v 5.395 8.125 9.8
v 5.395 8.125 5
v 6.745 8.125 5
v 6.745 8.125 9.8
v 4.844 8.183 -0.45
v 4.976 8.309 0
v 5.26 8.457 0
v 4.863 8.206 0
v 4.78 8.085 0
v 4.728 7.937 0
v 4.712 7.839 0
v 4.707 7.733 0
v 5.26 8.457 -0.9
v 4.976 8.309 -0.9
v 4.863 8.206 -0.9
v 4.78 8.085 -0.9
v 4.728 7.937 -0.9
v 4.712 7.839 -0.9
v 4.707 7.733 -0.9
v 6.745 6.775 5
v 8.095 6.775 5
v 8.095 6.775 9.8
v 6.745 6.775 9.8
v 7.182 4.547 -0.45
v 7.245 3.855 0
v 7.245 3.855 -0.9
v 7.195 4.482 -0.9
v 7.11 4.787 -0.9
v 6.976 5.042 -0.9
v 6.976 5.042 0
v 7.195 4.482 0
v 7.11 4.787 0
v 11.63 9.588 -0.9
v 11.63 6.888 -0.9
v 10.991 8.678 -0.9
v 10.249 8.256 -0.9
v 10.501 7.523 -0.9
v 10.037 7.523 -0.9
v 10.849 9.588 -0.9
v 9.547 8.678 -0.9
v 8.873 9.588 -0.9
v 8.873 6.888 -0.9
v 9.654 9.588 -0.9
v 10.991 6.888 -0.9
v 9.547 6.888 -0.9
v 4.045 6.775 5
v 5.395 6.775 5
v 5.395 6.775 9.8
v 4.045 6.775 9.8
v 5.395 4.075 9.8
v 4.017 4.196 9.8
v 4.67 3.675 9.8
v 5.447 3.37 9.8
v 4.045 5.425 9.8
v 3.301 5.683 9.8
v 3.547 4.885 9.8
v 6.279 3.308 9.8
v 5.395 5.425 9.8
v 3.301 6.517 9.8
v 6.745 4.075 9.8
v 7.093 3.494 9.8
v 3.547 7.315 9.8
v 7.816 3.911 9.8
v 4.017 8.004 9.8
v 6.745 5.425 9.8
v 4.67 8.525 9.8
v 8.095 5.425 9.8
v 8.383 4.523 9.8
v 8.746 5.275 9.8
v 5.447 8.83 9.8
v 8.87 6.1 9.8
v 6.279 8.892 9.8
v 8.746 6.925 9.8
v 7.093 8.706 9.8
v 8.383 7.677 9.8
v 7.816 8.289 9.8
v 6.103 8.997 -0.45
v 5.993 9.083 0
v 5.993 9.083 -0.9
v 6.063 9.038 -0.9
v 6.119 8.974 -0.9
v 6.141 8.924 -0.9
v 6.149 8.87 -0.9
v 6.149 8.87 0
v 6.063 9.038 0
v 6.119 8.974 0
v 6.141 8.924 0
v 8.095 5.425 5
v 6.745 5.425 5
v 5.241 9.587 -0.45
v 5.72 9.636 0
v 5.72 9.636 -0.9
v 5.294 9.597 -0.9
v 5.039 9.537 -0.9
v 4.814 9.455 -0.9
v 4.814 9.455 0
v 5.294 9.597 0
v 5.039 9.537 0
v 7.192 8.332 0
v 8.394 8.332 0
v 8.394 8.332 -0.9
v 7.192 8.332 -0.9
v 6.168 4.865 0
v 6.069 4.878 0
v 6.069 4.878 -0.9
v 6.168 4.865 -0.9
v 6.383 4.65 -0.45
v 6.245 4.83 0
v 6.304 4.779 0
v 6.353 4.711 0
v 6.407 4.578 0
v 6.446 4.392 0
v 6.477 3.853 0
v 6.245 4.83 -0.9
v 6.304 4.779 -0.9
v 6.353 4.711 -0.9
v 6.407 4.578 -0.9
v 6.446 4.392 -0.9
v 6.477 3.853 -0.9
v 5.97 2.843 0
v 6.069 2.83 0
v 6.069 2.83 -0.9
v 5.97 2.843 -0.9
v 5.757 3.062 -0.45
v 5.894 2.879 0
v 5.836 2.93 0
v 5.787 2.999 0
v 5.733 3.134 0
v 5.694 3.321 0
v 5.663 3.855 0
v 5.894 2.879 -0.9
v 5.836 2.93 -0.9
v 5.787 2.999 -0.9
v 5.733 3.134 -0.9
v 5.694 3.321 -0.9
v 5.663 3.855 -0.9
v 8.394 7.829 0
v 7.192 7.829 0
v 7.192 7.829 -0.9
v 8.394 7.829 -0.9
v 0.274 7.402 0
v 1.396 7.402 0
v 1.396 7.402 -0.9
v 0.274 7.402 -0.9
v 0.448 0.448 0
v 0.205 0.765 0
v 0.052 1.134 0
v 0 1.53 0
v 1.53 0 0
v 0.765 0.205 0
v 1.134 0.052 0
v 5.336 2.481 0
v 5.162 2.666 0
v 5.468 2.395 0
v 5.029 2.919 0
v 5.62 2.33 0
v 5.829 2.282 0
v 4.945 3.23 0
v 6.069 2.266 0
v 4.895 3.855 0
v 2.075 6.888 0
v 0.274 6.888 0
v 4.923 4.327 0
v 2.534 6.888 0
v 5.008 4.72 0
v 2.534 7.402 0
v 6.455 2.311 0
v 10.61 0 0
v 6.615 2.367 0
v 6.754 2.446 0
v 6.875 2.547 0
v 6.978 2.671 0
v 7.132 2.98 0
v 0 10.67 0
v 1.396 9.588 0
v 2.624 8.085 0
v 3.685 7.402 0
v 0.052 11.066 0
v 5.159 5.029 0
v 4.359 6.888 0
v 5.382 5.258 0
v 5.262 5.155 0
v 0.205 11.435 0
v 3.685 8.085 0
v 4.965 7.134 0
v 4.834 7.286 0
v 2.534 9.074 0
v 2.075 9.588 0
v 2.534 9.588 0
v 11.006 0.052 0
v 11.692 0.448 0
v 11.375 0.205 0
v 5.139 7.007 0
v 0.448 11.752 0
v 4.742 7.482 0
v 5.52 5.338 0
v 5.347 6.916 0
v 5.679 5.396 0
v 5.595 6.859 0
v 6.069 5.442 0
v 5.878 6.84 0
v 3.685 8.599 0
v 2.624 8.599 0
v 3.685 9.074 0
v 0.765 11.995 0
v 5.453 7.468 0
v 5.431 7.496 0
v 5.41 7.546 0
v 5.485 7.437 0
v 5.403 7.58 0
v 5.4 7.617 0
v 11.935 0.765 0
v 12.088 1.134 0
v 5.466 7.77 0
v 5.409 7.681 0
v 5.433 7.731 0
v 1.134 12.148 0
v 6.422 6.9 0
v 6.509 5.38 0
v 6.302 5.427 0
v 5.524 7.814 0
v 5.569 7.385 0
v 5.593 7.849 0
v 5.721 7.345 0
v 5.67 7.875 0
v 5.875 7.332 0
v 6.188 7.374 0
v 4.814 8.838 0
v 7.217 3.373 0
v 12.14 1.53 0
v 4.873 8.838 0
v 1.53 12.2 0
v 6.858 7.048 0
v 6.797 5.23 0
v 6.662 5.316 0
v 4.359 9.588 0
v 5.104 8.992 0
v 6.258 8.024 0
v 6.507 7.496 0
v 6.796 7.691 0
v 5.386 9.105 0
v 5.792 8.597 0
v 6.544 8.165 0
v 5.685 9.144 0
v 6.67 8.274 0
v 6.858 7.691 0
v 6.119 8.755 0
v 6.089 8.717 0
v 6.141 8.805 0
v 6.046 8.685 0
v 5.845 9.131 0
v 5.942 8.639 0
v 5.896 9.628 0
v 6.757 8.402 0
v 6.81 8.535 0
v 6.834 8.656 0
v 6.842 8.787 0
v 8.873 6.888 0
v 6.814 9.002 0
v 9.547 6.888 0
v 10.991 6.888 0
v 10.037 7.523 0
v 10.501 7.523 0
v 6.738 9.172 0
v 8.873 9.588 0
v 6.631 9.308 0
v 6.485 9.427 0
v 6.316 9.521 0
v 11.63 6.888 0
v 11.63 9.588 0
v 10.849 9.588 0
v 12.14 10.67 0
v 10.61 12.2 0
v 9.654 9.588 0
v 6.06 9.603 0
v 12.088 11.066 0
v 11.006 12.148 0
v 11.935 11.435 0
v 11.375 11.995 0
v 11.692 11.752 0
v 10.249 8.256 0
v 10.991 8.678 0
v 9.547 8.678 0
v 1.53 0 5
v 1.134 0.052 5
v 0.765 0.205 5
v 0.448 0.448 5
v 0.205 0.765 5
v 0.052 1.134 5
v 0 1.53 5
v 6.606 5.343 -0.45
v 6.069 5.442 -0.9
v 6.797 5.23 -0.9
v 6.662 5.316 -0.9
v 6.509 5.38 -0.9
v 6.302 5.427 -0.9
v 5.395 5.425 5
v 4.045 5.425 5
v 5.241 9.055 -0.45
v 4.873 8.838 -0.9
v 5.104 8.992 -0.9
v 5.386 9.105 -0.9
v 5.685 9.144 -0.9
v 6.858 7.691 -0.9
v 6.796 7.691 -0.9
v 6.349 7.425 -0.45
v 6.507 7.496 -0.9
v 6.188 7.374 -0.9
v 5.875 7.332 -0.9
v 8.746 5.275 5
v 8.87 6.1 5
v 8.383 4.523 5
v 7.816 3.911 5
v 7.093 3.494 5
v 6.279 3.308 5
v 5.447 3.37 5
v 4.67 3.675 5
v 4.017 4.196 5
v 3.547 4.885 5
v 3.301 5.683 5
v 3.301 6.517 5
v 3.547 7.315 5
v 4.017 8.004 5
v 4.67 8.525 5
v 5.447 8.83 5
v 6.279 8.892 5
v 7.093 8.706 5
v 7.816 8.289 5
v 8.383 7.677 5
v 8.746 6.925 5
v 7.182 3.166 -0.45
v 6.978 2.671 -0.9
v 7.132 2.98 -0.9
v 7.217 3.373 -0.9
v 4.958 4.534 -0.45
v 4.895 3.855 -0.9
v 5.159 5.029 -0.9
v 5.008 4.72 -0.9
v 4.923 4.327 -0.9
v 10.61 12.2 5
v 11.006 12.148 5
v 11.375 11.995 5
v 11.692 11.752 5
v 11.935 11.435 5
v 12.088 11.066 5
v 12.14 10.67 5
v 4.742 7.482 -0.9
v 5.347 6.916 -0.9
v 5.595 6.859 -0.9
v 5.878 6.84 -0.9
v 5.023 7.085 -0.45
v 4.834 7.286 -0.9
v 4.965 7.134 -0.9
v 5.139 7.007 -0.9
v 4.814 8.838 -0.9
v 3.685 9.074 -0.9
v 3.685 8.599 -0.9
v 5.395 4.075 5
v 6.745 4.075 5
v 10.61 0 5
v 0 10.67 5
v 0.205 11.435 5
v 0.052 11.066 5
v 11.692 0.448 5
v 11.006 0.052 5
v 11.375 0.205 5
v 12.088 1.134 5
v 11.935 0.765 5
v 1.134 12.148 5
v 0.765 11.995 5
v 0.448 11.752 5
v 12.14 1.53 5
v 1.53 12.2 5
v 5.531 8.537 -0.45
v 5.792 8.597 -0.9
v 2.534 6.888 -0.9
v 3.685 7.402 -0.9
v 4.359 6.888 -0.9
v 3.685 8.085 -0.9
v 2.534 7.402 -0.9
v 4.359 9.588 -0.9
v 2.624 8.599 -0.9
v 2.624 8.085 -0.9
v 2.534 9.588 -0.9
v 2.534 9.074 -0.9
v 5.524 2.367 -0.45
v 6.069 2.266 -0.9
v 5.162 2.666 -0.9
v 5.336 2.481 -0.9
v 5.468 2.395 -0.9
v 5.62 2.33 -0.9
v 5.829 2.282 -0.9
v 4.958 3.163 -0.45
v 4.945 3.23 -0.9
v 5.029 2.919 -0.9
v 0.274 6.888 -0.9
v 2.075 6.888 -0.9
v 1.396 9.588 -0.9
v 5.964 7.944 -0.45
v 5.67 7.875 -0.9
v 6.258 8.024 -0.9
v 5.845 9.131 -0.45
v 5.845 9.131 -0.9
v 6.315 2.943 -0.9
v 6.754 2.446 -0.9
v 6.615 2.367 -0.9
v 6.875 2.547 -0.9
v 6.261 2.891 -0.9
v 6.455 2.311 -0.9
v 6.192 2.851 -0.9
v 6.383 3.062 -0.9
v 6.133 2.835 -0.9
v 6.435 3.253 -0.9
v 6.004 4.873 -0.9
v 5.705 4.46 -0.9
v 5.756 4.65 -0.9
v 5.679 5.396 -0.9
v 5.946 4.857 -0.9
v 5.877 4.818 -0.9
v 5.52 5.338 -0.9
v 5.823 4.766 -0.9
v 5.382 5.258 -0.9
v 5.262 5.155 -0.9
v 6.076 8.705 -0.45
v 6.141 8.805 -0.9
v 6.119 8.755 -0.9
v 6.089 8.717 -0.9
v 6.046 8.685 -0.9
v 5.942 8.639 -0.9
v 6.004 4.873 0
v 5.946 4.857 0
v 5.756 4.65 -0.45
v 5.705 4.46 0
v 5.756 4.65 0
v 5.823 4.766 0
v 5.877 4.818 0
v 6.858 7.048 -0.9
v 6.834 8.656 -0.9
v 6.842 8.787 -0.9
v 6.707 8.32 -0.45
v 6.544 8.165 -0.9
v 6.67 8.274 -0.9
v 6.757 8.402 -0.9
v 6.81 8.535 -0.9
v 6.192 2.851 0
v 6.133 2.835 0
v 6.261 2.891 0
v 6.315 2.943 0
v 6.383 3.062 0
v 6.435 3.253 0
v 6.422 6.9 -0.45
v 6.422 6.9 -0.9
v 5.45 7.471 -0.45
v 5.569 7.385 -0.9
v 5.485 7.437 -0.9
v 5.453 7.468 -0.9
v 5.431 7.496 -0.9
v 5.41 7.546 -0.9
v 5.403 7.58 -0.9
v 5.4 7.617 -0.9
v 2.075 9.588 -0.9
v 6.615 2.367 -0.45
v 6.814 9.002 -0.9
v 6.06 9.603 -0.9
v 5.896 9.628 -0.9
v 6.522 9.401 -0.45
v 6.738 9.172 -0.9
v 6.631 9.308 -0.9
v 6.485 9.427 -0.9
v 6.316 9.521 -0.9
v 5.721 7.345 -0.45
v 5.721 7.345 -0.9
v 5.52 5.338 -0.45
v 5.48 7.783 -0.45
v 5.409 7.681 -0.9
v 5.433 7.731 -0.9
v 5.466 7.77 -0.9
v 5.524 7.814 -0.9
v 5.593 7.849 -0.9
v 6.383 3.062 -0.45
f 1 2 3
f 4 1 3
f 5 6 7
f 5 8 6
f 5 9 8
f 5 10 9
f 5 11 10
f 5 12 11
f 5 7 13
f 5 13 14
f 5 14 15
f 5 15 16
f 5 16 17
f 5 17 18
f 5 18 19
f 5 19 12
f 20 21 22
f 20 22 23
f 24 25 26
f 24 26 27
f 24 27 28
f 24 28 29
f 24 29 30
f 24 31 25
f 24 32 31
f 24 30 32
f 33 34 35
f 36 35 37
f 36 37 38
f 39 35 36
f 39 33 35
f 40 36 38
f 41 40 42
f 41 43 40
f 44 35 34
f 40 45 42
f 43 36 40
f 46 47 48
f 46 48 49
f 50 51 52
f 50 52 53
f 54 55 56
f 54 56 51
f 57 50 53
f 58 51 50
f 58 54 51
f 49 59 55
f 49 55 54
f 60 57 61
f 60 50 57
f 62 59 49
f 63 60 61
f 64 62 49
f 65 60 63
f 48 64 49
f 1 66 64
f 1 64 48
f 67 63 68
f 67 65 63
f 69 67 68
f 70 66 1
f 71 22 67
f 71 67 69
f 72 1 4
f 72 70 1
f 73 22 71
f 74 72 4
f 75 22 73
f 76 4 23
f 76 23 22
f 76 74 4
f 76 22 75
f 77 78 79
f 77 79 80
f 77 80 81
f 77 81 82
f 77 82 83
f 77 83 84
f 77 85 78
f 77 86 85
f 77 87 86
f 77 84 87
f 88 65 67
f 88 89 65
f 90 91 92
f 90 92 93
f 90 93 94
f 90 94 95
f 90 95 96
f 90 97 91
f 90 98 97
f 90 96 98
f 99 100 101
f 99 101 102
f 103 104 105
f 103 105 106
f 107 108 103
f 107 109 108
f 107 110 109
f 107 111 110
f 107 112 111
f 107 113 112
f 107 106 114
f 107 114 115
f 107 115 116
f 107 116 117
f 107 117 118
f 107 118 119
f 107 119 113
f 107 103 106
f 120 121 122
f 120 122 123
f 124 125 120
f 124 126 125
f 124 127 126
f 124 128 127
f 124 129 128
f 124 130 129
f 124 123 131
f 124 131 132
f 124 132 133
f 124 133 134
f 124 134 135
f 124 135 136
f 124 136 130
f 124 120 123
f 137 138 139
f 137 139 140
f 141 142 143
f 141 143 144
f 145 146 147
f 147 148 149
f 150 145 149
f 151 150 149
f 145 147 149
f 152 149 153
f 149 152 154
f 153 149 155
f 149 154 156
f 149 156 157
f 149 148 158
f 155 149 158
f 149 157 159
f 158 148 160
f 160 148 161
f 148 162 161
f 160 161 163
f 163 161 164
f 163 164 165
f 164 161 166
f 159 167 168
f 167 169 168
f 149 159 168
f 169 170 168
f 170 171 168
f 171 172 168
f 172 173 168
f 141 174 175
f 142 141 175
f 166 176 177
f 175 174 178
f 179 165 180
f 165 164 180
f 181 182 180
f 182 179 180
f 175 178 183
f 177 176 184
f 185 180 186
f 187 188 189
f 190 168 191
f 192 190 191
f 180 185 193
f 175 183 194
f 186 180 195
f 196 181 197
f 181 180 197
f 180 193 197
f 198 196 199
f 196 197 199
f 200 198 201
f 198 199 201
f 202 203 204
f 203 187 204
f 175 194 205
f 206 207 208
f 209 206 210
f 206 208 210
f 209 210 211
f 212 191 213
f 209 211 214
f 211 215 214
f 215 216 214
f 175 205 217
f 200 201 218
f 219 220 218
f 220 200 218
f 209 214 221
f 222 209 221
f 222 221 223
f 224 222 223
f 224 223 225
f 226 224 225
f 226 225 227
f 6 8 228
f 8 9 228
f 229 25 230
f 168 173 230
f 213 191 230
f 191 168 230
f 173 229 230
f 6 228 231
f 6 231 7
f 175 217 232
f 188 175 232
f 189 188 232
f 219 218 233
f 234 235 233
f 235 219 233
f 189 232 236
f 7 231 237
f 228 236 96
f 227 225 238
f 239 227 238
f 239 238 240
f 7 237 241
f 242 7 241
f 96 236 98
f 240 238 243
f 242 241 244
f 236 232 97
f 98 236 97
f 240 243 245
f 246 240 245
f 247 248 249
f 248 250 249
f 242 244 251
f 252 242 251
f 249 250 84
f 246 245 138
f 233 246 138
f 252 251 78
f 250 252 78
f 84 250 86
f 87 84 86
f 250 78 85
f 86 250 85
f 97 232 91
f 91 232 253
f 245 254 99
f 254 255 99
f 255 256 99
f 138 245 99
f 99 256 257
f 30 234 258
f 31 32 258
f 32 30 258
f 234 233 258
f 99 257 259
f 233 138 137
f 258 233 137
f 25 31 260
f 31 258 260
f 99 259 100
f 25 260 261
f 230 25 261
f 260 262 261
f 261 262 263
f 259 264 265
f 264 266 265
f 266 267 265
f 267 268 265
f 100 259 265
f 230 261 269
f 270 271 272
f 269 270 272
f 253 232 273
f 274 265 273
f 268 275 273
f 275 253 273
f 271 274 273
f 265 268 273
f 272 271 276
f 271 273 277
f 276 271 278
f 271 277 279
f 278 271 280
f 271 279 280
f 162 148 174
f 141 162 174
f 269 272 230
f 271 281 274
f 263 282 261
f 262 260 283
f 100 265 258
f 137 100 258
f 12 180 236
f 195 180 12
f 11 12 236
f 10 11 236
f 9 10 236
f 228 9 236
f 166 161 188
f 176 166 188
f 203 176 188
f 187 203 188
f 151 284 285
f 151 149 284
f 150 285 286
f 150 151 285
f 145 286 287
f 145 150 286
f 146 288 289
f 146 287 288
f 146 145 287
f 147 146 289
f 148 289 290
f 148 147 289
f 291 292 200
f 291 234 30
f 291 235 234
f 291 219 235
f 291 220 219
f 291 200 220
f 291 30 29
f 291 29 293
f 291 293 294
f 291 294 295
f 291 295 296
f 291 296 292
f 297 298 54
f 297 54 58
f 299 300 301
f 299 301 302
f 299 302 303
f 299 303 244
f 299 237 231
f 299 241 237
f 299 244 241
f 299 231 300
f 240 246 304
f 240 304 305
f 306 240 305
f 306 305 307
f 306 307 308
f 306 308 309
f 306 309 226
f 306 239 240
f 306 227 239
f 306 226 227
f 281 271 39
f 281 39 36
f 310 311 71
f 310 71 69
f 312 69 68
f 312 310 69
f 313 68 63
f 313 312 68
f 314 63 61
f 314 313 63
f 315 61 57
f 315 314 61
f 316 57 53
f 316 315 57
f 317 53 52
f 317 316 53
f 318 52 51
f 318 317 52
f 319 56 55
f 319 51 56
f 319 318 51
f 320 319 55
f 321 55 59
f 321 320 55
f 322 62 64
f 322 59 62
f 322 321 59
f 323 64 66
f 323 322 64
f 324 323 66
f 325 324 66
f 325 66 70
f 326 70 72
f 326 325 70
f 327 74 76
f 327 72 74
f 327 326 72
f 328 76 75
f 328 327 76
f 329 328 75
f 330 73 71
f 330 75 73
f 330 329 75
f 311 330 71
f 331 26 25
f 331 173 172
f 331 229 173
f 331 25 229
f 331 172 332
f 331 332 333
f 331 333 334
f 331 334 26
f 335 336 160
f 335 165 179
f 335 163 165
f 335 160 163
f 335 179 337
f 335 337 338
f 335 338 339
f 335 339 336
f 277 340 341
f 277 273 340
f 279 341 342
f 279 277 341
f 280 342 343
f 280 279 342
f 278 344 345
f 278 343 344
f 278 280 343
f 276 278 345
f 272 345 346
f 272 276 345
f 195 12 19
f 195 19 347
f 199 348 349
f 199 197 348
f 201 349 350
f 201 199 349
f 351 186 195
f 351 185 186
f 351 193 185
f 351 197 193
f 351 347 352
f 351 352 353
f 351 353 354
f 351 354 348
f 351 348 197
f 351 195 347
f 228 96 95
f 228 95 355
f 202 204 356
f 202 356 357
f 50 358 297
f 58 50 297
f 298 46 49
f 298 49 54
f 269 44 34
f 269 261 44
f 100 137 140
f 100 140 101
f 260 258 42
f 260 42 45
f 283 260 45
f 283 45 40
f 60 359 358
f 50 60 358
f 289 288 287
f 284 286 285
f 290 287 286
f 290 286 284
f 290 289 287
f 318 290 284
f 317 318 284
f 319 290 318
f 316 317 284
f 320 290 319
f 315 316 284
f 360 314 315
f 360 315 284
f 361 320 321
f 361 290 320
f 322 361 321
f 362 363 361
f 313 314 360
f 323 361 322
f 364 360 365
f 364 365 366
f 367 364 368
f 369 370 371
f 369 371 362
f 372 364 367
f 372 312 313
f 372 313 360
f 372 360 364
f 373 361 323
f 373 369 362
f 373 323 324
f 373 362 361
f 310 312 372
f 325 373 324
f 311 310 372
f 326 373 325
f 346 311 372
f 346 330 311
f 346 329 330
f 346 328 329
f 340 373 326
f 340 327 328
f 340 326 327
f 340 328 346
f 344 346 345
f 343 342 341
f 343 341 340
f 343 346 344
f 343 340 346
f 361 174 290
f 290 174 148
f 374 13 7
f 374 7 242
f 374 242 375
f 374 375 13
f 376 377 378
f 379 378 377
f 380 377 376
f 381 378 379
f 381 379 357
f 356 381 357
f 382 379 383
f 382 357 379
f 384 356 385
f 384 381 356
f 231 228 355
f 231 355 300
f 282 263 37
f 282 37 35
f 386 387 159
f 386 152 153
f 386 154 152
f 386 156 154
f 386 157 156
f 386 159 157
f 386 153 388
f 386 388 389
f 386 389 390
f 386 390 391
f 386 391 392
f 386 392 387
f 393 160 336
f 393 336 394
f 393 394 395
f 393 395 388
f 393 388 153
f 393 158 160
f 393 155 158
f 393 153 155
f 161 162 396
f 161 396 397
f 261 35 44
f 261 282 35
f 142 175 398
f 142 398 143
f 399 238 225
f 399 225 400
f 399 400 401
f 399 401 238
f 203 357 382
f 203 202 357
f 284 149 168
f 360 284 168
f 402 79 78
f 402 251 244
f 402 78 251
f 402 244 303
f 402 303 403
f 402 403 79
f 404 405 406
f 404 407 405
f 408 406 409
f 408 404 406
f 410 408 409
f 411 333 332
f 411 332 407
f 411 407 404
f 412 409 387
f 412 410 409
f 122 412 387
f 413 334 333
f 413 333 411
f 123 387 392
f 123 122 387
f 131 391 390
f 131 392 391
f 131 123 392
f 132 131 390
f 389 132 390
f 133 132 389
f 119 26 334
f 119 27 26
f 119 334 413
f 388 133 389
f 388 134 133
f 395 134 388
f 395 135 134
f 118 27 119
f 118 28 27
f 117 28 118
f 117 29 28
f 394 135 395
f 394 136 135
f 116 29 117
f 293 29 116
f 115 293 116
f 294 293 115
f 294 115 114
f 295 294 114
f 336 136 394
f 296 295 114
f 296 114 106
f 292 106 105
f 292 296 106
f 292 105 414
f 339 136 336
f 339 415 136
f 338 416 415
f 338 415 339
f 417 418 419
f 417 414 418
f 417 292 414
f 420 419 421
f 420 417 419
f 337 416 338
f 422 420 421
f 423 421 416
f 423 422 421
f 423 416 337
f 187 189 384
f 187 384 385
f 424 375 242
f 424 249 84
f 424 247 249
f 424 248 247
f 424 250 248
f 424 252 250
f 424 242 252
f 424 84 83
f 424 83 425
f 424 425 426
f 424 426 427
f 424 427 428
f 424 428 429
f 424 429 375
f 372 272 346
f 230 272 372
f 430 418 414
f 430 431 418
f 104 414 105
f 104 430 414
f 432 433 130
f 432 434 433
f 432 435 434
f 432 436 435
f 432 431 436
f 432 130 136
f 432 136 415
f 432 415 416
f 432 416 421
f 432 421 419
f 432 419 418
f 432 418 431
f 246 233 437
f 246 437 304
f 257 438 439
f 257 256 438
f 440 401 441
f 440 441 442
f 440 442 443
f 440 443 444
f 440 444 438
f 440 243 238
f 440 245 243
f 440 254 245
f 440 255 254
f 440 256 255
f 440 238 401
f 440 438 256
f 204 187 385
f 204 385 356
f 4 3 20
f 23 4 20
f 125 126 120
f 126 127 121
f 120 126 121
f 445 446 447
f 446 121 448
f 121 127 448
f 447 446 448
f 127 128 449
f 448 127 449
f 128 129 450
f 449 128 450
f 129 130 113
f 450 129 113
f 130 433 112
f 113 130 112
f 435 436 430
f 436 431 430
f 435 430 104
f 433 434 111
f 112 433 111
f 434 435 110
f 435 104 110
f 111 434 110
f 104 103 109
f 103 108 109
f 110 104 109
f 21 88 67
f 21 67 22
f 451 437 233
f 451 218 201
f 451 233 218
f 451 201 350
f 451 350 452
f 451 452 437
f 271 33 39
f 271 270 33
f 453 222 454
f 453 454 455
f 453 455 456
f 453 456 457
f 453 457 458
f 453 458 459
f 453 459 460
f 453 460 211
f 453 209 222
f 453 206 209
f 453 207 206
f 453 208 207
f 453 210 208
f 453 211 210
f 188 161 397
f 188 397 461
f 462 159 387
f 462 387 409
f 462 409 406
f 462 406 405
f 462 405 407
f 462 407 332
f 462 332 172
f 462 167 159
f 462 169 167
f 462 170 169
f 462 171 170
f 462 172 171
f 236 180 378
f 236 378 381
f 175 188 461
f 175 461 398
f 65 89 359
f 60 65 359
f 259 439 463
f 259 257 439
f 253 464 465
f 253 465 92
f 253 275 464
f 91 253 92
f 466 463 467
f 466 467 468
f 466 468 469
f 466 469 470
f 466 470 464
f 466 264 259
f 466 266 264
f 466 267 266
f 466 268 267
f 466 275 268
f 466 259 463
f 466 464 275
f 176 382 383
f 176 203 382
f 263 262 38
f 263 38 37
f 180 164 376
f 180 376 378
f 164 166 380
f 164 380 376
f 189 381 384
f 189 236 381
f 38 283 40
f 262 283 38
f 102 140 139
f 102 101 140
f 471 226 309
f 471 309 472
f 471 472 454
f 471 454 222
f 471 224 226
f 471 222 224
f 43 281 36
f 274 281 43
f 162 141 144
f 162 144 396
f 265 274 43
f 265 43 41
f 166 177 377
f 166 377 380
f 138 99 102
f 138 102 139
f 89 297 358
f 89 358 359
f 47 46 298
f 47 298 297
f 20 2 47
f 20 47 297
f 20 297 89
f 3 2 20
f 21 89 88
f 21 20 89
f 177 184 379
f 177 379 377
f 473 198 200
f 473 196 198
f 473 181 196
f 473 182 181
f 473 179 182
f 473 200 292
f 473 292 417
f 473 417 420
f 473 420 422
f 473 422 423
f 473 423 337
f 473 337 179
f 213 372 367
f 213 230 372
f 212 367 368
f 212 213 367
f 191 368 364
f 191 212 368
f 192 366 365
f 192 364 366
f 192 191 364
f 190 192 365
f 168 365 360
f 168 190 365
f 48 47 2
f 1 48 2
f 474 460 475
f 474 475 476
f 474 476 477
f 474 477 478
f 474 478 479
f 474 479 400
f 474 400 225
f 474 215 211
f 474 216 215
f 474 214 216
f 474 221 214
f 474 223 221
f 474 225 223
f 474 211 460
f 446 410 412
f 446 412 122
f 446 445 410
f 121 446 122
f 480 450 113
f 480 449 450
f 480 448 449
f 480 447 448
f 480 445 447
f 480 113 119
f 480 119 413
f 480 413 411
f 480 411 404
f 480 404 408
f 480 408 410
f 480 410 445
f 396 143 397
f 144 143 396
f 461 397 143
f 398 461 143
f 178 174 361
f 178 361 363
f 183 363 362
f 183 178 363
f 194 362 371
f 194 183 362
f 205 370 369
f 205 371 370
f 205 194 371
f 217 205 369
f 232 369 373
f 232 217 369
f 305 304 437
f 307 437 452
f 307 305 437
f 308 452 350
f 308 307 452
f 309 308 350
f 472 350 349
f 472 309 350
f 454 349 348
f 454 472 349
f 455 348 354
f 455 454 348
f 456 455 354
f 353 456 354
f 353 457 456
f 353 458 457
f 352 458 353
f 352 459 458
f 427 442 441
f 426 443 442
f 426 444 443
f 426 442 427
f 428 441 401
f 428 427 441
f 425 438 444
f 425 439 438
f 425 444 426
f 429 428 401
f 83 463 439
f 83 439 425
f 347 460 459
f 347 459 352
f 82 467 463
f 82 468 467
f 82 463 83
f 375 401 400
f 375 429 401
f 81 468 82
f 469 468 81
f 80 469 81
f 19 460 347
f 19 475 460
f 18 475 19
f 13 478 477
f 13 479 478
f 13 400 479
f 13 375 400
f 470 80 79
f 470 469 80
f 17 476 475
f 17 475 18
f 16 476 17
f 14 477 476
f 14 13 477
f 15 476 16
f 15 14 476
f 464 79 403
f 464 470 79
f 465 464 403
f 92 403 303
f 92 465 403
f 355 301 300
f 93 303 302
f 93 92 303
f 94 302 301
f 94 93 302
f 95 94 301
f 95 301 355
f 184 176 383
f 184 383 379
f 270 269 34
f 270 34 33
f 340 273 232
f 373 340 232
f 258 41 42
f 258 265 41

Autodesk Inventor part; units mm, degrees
ref_plane "YZ Plane" through (0, 0, 0) normal (1, 0, 0) x (0, 1, 0)
ref_plane "XZ Plane" through (0, 0, 0) normal (0, 1, 0) x (-1, 0, 0)
sketch "Sketch1" plane through (0, 0, 0) normal (0, 0, 1) x (1, 0, 0)
  line L0 (14.6962, 12.74) -> (14.6962, 0) construction
  line L1 (10.61, 12.2) -> (1.53, 12.2)
  arc A0 (1.53, 12.2) -> (0, 10.67) centre (1.53, 10.67) ccw
  line L2 (0, 10.67) -> (0, 1.53)
  arc A1 (0, 1.53) -> (1.53, 0) centre (1.53, 1.53) ccw
  line L3 (1.53, 0) -> (10.61, 0)
  arc A2 (10.61, 0) -> (12.14, 1.53) centre (10.61, 1.53) ccw
  arc A3 (12.14, 10.67) -> (10.61, 12.2) centre (10.61, 10.67) ccw
  line L4 (12.14, 10.67) -> (12.14, 1.53)
  point P0 (0, 0)
  point P1 (0, 0)
  dimension "d10" = 12.74
ref_plane "Work Plane1" through (0, 0, 5) normal (0, 0, 1) x (1, 0, 0)
sketch "Sketch2" plane through (0, 0, 5) normal (0, 0, 1) x (1, 0, 0)
  line L0 (10.88, 12.74) -> (1.8, 12.74) projected
  line L1 (10.88, 12.74) -> (1.8, 12.74) projected
  arc A0 (1.8, 12.74) -> (0, 10.94) centre (1.8, 10.94) ccw projected
  line L2 (0, 10.94) -> (0, 1.8) projected
  arc A1 (0, 1.8) -> (1.8, 0) centre (1.8, 1.8) ccw projected
  line L3 (1.8, 0) -> (10.88, 0) projected
  arc A2 (10.88, 0) -> (12.68, 1.8) centre (10.88, 1.8) ccw projected
  line L4 (12.68, 1.8) -> (12.68, 10.94) projected
  arc A3 (12.68, 10.94) -> (10.88, 12.74) centre (10.88, 10.94) ccw projected
  circle A4 centre (6.34, 6.37) radius 2.8
  line L5 (5.665, 8.395) -> (7.015, 8.395)
  line L6 (7.015, 4.345) -> (5.665, 4.345)
  line L7 (5.665, 4.345) -> (7.015, 8.395) construction
  line L8 (5.665, 8.395) -> (7.015, 4.345) construction
  line L9 (8.365, 5.695) -> (8.365, 7.045)
  line L10 (4.315, 7.045) -> (4.315, 5.695)
  line L11 (4.315, 5.695) -> (8.365, 7.045) construction
  line L12 (8.365, 5.695) -> (4.315, 7.045) construction
  line L13 (4.315, 5.695) -> (5.665, 5.695)
  line L14 (7.015, 5.695) -> (8.365, 5.695)
  line L15 (5.665, 4.345) -> (5.665, 5.695)
  line L16 (5.665, 7.045) -> (5.665, 8.395)
  line L17 (8.365, 7.045) -> (7.015, 7.045)
  line L18 (5.665, 7.045) -> (4.315, 7.045)
  line L19 (7.015, 8.395) -> (7.015, 7.045)
  line L20 (7.015, 5.695) -> (7.015, 4.345)
  point P0 (0, 0)
  dimension "d3" = 5.6
  dimension "d4" = 4.05
  dimension "d5" = 1.35
  dimension "d6" = 4.05
  dimension "d7" = 1.35
extrude "Extrusion3" add sketch "Sketch1" along normal blind 5
sketch "Sketch3" plane through (0, 0, 5) normal (0, 0, 1) x (1, 0, 0)
  line L0 (10.61, 12.47) -> (1.53, 12.47)
  line L1 (10.61, 12.47) -> (1.53, 12.47)
  arc A0 (1.53, 12.47) -> (-0.27, 10.67) centre (1.53, 10.67) ccw
  line L2 (-0.27, 10.67) -> (-0.27, 1.53)
  arc A1 (-0.27, 1.53) -> (1.53, -0.27) centre (1.53, 1.53) ccw
  line L3 (1.53, -0.27) -> (10.61, -0.27)
  arc A2 (10.61, -0.27) -> (12.41, 1.53) centre (10.61, 1.53) ccw
  line L4 (12.41, 1.53) -> (12.41, 10.67)
  arc A3 (12.41, 10.67) -> (10.61, 12.47) centre (10.61, 10.67) ccw
  circle A4 centre (6.07, 6.1) radius 2.8
  line L5 (5.395, 8.125) -> (6.745, 8.125)
  line L6 (6.745, 4.075) -> (5.395, 4.075)
  line L7 (5.395, 4.075) -> (6.745, 8.125) construction
  line L8 (5.395, 8.125) -> (6.745, 4.075) construction
  line L9 (8.095, 5.425) -> (8.095, 6.775)
  line L10 (4.045, 6.775) -> (4.045, 5.425)
  line L11 (4.045, 5.425) -> (8.095, 6.775) construction
  line L12 (8.095, 5.425) -> (4.045, 6.775) construction
  line L13 (4.045, 5.425) -> (5.395, 5.425)
  line L14 (6.745, 5.425) -> (8.095, 5.425)
  line L15 (5.395, 4.075) -> (5.395, 5.425)
  line L16 (5.395, 6.775) -> (5.395, 8.125)
  line L17 (8.095, 6.775) -> (6.745, 6.775)
  line L18 (5.395, 6.775) -> (4.045, 6.775)
  line L19 (6.745, 8.125) -> (6.745, 6.775)
  line L20 (6.745, 5.425) -> (6.745, 4.075)
  line L21 (10.61, 12.2) -> (1.53, 12.2) projected
  line L22 (0, 10.67) -> (0, 1.53) projected
  point P0 (0, 0)
  point P1 (-0.27, -0.27)
  point P2 (6.07, 12.2)
  point P3 (0, 6.1)
  point P4 (6.07, 6.1)
  dimension "d14" = 5.6
  dimension "d15" = 4.05
  dimension "d16" = 1.35
  dimension "d17" = 4.05
  dimension "d18" = 1.35
extrude "Extrusion4" add sketch "Sketch3" along normal blind 4.8 contours A4
sketch "Sketch4" plane through (0, 0, 0) normal (0, 0, -1) x (-1, 0, 0)
  line L0 (-13.9436, 0) -> (-13.9436, 2.266)
  line L1 (-15.5559, 0) -> (-15.5559, 6.84)
  line L2 (-1.53, 0) -> (-10.61, 0) projected
  line L3 (-11.9098, 9.6363) -> (-0.2302, 9.6363) construction
  line L4 (-0.2302, 9.6363) -> (-0.2302, 6.84) construction
  line L5 (-0.2302, 6.84) -> (-11.9098, 6.84) construction
  line L6 (-11.9098, 6.84) -> (-11.9098, 9.6363) construction
  line L7 (-7.4059, 5.4421) -> (-4.7341, 5.4421) construction
  line L8 (-4.7341, 5.4421) -> (-4.7341, 2.266) construction
  line L9 (-4.7341, 2.266) -> (-7.4059, 2.266) construction
  line L10 (-7.4059, 2.266) -> (-7.4059, 5.4421) construction
  line L11 (-8.8728, 6.8881) -> (-9.5467, 6.8881)
  line L12 (-9.5467, 6.8881) -> (-9.5467, 8.6779)
  line L13 (-9.5467, 8.6779) -> (-10.0369, 7.5227)
  line L14 (-10.0369, 7.5227) -> (-10.5007, 7.5227)
  line L15 (-10.5007, 7.5227) -> (-10.9908, 8.6779)
  line L16 (-10.9908, 8.6779) -> (-10.9908, 6.8881)
  line L17 (-10.9908, 6.8881) -> (-11.6297, 6.8881)
  line L18 (-11.6297, 6.8881) -> (-11.6297, 9.5881)
  line L19 (-11.6297, 9.5881) -> (-10.8486, 9.5881)
  line L20 (-10.8486, 9.5881) -> (-10.2491, 8.2556)
  line L21 (-10.2491, 8.2556) -> (-9.654, 9.5881)
  line L22 (-9.654, 9.5881) -> (-8.8728, 9.5881)
  line L23 (-8.8728, 9.5881) -> (-8.8728, 6.8881)
  line L24 (-7.1924, 7.829) -> (-8.3937, 7.829)
  line L25 (-8.3937, 7.829) -> (-8.3937, 8.3322)
  line L26 (-8.3937, 8.3322) -> (-7.1924, 8.3322)
  line L27 (-7.1924, 8.3322) -> (-7.1924, 7.829)
  spline S0 degree 2 poles (-5.8775, 6.84) (-6.1882, 6.84) (-6.6564, 6.9603) (-6.8577, 7.0479) knots 0 0 0 1 2 2 2
  line L28 (-6.8577, 7.0479) -> (-6.8577, 7.6911)
  line L29 (-6.8577, 7.6911) -> (-6.7964, 7.6911)
  spline S1 degree 2 poles (-6.7964, 7.6911) (-6.5929, 7.5183) (-6.105, 7.3323) (-5.8753, 7.3323) knots 0 0 0 1 2 2 2
  spline S2 degree 2 poles (-5.8753, 7.3323) (-5.8162, 7.3323) (-5.6258, 7.3586) (-5.5689, 7.3848) knots 0 0 0 1 2 2 2
  spline S3 degree 2 poles (-5.5689, 7.3848) (-5.4989, 7.4154) (-5.4005, 7.527) (-5.4005, 7.6167) knots 0 0 0 1 2 2 2
  spline S4 degree 2 poles (-5.4005, 7.6167) (-5.4005, 7.7196) (-5.5602, 7.8465) (-5.6696, 7.8749) knots 0 0 0 1 2 2 2
  spline S5 degree 2 poles (-5.6696, 7.8749) (-5.8074, 7.9121) (-6.1203, 7.9756) (-6.2582, 8.0237) knots 0 0 0 1 2 2 2
  spline S6 degree 2 poles (-6.2582, 8.0237) (-6.5711, 8.1331) (-6.8424, 8.5073) (-6.8424, 8.7873) knots 0 0 0 1 2 2 2
  spline S7 degree 2 poles (-6.8424, 8.7873) (-6.8424, 9.1659) (-6.2013, 9.6363) (-5.7199, 9.6363) knots 0 0 0 1 2 2 2
  spline S8 degree 2 poles (-5.7199, 9.6363) (-5.4792, 9.6363) (-5.0023, 9.5378) (-4.8141, 9.4547) knots 0 0 0 1 2 2 2
  line L30 (-4.8141, 9.4547) -> (-4.8141, 8.8377)
  line L31 (-4.8141, 8.8377) -> (-4.8732, 8.8377)
  spline S9 degree 2 poles (-4.8732, 8.8377) (-5.0241, 8.9667) (-5.4574, 9.144) (-5.6849, 9.144) knots 0 0 0 1 2 2 2
  spline S10 degree 2 poles (-5.6849, 9.144) (-5.7746, 9.144) (-5.9147, 9.1177) (-5.9934, 9.0827) knots 0 0 0 1 2 2 2
  spline S11 degree 2 poles (-5.9934, 9.0827) (-6.0569, 9.0543) (-6.1488, 8.9405) (-6.1488, 8.8705) knots 0 0 0 1 2 2 2
  spline S12 degree 2 poles (-6.1488, 8.8705) (-6.1488, 8.7654) (-6.0022, 8.6451) (-5.7921, 8.597) knots 0 0 0 1 2 2 2
  spline S13 degree 2 poles (-5.7921, 8.597) (-5.6565, 8.5663) (-5.4048, 8.5073) (-5.2604, 8.4569) knots 0 0 0 1 2 2 2
  spline S14 degree 2 poles (-5.2604, 8.4569) (-4.9804, 8.3541) (-4.7069, 8.0128) (-4.7069, 7.7327) knots 0 0 0 1 2 2 2
  spline S15 degree 2 poles (-4.7069, 7.7327) (-4.7069, 7.3301) (-5.3392, 6.84) (-5.8775, 6.84) knots 0 0 0 1 2 2 2
  line L32 (-4.359, 6.8881) -> (-4.359, 9.5881)
  line L33 (-4.359, 9.5881) -> (-2.5342, 9.5881)
  line L34 (-2.5342, 9.5881) -> (-2.5342, 9.074)
  line L35 (-2.5342, 9.074) -> (-3.6851, 9.074)
  line L36 (-3.6851, 9.074) -> (-3.6851, 8.5992)
  line L37 (-3.6851, 8.5992) -> (-2.6239, 8.5992)
  line L38 (-2.6239, 8.5992) -> (-2.6239, 8.085)
  line L39 (-2.6239, 8.085) -> (-3.6851, 8.085)
  line L40 (-3.6851, 8.085) -> (-3.6851, 7.4023)
  line L41 (-3.6851, 7.4023) -> (-2.5342, 7.4023)
  line L42 (-2.5342, 7.4023) -> (-2.5342, 6.8881)
  line L43 (-2.5342, 6.8881) -> (-4.359, 6.8881)
  line L44 (-0.274, 6.8881) -> (-2.0747, 6.8881)
  line L45 (-2.0747, 6.8881) -> (-2.0747, 9.5881)
  line L46 (-2.0747, 9.5881) -> (-1.3964, 9.5881)
  line L47 (-1.3964, 9.5881) -> (-1.3964, 7.4023)
  line L48 (-1.3964, 7.4023) -> (-0.274, 7.4023)
  line L49 (-0.274, 7.4023) -> (-0.274, 6.8881)
  spline S16 degree 2 poles (-4.8947, 3.8553) (-4.8947, 3.4598) (-5.0208, 2.8666) (-5.1617, 2.6664) knots 0 0 0 1 2 2 2
  spline S17 degree 2 poles (-5.1617, 2.6664) (-5.3001, 2.4687) (-5.7475, 2.266) (-6.0688, 2.266) knots 0 0 0 1 2 2 2
  spline S18 degree 2 poles (-6.0688, 2.266) (-6.3925, 2.266) (-6.8374, 2.4687) (-6.9783, 2.6713) knots 0 0 0 1 2 2 2
  spline S19 degree 2 poles (-6.9783, 2.6713) (-7.1192, 2.8716) (-7.2453, 3.4598) (-7.2453, 3.8553) knots 0 0 0 1 2 2 2
  spline S20 degree 2 poles (-7.2453, 3.8553) (-7.2453, 4.2606) (-7.1192, 4.834) (-6.9759, 5.0416) knots 0 0 0 1 2 2 2
  spline S21 degree 2 poles (-6.9759, 5.0416) (-6.8325, 5.2443) (-6.3802, 5.4421) (-6.0688, 5.4421) knots 0 0 0 1 2 2 2
  spline S22 degree 2 poles (-6.0688, 5.4421) (-5.74, 5.4421) (-5.3001, 5.2344) (-5.1592, 5.0293) knots 0 0 0 1 2 2 2
  spline S23 degree 2 poles (-5.1592, 5.0293) (-5.0208, 4.8291) (-4.8947, 4.2384) (-4.8947, 3.8553) knots 0 0 0 1 2 2 2
  spline S24 degree 2 poles (-5.6634, 3.8553) (-5.6634, 4.4213) (-5.8488, 4.8785) (-6.0688, 4.8785) knots 0 0 0 1 2 2 2
  spline S25 degree 2 poles (-6.0688, 4.8785) (-6.2887, 4.8785) (-6.4766, 4.4213) (-6.4766, 3.8528) knots 0 0 0 1 2 2 2
  spline S26 degree 2 poles (-6.4766, 3.8528) (-6.4766, 3.2942) (-6.2887, 2.8295) (-6.0688, 2.8295) knots 0 0 0 1 2 2 2
  spline S27 degree 2 poles (-6.0688, 2.8295) (-5.8513, 2.8295) (-5.6634, 3.2942) (-5.6634, 3.8553) knots 0 0 0 1 2 2 2
  point P0 (0, 0)
  point P1 (-6.07, 0)
  point P2 (-6.07, 2.266)
  point P3 (-6.07, 6.84)
  point P4 (-6.07, 6.84)
  point P5 (-6.07, 2.266)
  dimension "d21" = 2.266
  dimension "d22" = 6.84
extrude "Extrusion5" add sketch "Sketch4" along normal blind 0.9
properties part number "IPC M-SEL 0 key"
